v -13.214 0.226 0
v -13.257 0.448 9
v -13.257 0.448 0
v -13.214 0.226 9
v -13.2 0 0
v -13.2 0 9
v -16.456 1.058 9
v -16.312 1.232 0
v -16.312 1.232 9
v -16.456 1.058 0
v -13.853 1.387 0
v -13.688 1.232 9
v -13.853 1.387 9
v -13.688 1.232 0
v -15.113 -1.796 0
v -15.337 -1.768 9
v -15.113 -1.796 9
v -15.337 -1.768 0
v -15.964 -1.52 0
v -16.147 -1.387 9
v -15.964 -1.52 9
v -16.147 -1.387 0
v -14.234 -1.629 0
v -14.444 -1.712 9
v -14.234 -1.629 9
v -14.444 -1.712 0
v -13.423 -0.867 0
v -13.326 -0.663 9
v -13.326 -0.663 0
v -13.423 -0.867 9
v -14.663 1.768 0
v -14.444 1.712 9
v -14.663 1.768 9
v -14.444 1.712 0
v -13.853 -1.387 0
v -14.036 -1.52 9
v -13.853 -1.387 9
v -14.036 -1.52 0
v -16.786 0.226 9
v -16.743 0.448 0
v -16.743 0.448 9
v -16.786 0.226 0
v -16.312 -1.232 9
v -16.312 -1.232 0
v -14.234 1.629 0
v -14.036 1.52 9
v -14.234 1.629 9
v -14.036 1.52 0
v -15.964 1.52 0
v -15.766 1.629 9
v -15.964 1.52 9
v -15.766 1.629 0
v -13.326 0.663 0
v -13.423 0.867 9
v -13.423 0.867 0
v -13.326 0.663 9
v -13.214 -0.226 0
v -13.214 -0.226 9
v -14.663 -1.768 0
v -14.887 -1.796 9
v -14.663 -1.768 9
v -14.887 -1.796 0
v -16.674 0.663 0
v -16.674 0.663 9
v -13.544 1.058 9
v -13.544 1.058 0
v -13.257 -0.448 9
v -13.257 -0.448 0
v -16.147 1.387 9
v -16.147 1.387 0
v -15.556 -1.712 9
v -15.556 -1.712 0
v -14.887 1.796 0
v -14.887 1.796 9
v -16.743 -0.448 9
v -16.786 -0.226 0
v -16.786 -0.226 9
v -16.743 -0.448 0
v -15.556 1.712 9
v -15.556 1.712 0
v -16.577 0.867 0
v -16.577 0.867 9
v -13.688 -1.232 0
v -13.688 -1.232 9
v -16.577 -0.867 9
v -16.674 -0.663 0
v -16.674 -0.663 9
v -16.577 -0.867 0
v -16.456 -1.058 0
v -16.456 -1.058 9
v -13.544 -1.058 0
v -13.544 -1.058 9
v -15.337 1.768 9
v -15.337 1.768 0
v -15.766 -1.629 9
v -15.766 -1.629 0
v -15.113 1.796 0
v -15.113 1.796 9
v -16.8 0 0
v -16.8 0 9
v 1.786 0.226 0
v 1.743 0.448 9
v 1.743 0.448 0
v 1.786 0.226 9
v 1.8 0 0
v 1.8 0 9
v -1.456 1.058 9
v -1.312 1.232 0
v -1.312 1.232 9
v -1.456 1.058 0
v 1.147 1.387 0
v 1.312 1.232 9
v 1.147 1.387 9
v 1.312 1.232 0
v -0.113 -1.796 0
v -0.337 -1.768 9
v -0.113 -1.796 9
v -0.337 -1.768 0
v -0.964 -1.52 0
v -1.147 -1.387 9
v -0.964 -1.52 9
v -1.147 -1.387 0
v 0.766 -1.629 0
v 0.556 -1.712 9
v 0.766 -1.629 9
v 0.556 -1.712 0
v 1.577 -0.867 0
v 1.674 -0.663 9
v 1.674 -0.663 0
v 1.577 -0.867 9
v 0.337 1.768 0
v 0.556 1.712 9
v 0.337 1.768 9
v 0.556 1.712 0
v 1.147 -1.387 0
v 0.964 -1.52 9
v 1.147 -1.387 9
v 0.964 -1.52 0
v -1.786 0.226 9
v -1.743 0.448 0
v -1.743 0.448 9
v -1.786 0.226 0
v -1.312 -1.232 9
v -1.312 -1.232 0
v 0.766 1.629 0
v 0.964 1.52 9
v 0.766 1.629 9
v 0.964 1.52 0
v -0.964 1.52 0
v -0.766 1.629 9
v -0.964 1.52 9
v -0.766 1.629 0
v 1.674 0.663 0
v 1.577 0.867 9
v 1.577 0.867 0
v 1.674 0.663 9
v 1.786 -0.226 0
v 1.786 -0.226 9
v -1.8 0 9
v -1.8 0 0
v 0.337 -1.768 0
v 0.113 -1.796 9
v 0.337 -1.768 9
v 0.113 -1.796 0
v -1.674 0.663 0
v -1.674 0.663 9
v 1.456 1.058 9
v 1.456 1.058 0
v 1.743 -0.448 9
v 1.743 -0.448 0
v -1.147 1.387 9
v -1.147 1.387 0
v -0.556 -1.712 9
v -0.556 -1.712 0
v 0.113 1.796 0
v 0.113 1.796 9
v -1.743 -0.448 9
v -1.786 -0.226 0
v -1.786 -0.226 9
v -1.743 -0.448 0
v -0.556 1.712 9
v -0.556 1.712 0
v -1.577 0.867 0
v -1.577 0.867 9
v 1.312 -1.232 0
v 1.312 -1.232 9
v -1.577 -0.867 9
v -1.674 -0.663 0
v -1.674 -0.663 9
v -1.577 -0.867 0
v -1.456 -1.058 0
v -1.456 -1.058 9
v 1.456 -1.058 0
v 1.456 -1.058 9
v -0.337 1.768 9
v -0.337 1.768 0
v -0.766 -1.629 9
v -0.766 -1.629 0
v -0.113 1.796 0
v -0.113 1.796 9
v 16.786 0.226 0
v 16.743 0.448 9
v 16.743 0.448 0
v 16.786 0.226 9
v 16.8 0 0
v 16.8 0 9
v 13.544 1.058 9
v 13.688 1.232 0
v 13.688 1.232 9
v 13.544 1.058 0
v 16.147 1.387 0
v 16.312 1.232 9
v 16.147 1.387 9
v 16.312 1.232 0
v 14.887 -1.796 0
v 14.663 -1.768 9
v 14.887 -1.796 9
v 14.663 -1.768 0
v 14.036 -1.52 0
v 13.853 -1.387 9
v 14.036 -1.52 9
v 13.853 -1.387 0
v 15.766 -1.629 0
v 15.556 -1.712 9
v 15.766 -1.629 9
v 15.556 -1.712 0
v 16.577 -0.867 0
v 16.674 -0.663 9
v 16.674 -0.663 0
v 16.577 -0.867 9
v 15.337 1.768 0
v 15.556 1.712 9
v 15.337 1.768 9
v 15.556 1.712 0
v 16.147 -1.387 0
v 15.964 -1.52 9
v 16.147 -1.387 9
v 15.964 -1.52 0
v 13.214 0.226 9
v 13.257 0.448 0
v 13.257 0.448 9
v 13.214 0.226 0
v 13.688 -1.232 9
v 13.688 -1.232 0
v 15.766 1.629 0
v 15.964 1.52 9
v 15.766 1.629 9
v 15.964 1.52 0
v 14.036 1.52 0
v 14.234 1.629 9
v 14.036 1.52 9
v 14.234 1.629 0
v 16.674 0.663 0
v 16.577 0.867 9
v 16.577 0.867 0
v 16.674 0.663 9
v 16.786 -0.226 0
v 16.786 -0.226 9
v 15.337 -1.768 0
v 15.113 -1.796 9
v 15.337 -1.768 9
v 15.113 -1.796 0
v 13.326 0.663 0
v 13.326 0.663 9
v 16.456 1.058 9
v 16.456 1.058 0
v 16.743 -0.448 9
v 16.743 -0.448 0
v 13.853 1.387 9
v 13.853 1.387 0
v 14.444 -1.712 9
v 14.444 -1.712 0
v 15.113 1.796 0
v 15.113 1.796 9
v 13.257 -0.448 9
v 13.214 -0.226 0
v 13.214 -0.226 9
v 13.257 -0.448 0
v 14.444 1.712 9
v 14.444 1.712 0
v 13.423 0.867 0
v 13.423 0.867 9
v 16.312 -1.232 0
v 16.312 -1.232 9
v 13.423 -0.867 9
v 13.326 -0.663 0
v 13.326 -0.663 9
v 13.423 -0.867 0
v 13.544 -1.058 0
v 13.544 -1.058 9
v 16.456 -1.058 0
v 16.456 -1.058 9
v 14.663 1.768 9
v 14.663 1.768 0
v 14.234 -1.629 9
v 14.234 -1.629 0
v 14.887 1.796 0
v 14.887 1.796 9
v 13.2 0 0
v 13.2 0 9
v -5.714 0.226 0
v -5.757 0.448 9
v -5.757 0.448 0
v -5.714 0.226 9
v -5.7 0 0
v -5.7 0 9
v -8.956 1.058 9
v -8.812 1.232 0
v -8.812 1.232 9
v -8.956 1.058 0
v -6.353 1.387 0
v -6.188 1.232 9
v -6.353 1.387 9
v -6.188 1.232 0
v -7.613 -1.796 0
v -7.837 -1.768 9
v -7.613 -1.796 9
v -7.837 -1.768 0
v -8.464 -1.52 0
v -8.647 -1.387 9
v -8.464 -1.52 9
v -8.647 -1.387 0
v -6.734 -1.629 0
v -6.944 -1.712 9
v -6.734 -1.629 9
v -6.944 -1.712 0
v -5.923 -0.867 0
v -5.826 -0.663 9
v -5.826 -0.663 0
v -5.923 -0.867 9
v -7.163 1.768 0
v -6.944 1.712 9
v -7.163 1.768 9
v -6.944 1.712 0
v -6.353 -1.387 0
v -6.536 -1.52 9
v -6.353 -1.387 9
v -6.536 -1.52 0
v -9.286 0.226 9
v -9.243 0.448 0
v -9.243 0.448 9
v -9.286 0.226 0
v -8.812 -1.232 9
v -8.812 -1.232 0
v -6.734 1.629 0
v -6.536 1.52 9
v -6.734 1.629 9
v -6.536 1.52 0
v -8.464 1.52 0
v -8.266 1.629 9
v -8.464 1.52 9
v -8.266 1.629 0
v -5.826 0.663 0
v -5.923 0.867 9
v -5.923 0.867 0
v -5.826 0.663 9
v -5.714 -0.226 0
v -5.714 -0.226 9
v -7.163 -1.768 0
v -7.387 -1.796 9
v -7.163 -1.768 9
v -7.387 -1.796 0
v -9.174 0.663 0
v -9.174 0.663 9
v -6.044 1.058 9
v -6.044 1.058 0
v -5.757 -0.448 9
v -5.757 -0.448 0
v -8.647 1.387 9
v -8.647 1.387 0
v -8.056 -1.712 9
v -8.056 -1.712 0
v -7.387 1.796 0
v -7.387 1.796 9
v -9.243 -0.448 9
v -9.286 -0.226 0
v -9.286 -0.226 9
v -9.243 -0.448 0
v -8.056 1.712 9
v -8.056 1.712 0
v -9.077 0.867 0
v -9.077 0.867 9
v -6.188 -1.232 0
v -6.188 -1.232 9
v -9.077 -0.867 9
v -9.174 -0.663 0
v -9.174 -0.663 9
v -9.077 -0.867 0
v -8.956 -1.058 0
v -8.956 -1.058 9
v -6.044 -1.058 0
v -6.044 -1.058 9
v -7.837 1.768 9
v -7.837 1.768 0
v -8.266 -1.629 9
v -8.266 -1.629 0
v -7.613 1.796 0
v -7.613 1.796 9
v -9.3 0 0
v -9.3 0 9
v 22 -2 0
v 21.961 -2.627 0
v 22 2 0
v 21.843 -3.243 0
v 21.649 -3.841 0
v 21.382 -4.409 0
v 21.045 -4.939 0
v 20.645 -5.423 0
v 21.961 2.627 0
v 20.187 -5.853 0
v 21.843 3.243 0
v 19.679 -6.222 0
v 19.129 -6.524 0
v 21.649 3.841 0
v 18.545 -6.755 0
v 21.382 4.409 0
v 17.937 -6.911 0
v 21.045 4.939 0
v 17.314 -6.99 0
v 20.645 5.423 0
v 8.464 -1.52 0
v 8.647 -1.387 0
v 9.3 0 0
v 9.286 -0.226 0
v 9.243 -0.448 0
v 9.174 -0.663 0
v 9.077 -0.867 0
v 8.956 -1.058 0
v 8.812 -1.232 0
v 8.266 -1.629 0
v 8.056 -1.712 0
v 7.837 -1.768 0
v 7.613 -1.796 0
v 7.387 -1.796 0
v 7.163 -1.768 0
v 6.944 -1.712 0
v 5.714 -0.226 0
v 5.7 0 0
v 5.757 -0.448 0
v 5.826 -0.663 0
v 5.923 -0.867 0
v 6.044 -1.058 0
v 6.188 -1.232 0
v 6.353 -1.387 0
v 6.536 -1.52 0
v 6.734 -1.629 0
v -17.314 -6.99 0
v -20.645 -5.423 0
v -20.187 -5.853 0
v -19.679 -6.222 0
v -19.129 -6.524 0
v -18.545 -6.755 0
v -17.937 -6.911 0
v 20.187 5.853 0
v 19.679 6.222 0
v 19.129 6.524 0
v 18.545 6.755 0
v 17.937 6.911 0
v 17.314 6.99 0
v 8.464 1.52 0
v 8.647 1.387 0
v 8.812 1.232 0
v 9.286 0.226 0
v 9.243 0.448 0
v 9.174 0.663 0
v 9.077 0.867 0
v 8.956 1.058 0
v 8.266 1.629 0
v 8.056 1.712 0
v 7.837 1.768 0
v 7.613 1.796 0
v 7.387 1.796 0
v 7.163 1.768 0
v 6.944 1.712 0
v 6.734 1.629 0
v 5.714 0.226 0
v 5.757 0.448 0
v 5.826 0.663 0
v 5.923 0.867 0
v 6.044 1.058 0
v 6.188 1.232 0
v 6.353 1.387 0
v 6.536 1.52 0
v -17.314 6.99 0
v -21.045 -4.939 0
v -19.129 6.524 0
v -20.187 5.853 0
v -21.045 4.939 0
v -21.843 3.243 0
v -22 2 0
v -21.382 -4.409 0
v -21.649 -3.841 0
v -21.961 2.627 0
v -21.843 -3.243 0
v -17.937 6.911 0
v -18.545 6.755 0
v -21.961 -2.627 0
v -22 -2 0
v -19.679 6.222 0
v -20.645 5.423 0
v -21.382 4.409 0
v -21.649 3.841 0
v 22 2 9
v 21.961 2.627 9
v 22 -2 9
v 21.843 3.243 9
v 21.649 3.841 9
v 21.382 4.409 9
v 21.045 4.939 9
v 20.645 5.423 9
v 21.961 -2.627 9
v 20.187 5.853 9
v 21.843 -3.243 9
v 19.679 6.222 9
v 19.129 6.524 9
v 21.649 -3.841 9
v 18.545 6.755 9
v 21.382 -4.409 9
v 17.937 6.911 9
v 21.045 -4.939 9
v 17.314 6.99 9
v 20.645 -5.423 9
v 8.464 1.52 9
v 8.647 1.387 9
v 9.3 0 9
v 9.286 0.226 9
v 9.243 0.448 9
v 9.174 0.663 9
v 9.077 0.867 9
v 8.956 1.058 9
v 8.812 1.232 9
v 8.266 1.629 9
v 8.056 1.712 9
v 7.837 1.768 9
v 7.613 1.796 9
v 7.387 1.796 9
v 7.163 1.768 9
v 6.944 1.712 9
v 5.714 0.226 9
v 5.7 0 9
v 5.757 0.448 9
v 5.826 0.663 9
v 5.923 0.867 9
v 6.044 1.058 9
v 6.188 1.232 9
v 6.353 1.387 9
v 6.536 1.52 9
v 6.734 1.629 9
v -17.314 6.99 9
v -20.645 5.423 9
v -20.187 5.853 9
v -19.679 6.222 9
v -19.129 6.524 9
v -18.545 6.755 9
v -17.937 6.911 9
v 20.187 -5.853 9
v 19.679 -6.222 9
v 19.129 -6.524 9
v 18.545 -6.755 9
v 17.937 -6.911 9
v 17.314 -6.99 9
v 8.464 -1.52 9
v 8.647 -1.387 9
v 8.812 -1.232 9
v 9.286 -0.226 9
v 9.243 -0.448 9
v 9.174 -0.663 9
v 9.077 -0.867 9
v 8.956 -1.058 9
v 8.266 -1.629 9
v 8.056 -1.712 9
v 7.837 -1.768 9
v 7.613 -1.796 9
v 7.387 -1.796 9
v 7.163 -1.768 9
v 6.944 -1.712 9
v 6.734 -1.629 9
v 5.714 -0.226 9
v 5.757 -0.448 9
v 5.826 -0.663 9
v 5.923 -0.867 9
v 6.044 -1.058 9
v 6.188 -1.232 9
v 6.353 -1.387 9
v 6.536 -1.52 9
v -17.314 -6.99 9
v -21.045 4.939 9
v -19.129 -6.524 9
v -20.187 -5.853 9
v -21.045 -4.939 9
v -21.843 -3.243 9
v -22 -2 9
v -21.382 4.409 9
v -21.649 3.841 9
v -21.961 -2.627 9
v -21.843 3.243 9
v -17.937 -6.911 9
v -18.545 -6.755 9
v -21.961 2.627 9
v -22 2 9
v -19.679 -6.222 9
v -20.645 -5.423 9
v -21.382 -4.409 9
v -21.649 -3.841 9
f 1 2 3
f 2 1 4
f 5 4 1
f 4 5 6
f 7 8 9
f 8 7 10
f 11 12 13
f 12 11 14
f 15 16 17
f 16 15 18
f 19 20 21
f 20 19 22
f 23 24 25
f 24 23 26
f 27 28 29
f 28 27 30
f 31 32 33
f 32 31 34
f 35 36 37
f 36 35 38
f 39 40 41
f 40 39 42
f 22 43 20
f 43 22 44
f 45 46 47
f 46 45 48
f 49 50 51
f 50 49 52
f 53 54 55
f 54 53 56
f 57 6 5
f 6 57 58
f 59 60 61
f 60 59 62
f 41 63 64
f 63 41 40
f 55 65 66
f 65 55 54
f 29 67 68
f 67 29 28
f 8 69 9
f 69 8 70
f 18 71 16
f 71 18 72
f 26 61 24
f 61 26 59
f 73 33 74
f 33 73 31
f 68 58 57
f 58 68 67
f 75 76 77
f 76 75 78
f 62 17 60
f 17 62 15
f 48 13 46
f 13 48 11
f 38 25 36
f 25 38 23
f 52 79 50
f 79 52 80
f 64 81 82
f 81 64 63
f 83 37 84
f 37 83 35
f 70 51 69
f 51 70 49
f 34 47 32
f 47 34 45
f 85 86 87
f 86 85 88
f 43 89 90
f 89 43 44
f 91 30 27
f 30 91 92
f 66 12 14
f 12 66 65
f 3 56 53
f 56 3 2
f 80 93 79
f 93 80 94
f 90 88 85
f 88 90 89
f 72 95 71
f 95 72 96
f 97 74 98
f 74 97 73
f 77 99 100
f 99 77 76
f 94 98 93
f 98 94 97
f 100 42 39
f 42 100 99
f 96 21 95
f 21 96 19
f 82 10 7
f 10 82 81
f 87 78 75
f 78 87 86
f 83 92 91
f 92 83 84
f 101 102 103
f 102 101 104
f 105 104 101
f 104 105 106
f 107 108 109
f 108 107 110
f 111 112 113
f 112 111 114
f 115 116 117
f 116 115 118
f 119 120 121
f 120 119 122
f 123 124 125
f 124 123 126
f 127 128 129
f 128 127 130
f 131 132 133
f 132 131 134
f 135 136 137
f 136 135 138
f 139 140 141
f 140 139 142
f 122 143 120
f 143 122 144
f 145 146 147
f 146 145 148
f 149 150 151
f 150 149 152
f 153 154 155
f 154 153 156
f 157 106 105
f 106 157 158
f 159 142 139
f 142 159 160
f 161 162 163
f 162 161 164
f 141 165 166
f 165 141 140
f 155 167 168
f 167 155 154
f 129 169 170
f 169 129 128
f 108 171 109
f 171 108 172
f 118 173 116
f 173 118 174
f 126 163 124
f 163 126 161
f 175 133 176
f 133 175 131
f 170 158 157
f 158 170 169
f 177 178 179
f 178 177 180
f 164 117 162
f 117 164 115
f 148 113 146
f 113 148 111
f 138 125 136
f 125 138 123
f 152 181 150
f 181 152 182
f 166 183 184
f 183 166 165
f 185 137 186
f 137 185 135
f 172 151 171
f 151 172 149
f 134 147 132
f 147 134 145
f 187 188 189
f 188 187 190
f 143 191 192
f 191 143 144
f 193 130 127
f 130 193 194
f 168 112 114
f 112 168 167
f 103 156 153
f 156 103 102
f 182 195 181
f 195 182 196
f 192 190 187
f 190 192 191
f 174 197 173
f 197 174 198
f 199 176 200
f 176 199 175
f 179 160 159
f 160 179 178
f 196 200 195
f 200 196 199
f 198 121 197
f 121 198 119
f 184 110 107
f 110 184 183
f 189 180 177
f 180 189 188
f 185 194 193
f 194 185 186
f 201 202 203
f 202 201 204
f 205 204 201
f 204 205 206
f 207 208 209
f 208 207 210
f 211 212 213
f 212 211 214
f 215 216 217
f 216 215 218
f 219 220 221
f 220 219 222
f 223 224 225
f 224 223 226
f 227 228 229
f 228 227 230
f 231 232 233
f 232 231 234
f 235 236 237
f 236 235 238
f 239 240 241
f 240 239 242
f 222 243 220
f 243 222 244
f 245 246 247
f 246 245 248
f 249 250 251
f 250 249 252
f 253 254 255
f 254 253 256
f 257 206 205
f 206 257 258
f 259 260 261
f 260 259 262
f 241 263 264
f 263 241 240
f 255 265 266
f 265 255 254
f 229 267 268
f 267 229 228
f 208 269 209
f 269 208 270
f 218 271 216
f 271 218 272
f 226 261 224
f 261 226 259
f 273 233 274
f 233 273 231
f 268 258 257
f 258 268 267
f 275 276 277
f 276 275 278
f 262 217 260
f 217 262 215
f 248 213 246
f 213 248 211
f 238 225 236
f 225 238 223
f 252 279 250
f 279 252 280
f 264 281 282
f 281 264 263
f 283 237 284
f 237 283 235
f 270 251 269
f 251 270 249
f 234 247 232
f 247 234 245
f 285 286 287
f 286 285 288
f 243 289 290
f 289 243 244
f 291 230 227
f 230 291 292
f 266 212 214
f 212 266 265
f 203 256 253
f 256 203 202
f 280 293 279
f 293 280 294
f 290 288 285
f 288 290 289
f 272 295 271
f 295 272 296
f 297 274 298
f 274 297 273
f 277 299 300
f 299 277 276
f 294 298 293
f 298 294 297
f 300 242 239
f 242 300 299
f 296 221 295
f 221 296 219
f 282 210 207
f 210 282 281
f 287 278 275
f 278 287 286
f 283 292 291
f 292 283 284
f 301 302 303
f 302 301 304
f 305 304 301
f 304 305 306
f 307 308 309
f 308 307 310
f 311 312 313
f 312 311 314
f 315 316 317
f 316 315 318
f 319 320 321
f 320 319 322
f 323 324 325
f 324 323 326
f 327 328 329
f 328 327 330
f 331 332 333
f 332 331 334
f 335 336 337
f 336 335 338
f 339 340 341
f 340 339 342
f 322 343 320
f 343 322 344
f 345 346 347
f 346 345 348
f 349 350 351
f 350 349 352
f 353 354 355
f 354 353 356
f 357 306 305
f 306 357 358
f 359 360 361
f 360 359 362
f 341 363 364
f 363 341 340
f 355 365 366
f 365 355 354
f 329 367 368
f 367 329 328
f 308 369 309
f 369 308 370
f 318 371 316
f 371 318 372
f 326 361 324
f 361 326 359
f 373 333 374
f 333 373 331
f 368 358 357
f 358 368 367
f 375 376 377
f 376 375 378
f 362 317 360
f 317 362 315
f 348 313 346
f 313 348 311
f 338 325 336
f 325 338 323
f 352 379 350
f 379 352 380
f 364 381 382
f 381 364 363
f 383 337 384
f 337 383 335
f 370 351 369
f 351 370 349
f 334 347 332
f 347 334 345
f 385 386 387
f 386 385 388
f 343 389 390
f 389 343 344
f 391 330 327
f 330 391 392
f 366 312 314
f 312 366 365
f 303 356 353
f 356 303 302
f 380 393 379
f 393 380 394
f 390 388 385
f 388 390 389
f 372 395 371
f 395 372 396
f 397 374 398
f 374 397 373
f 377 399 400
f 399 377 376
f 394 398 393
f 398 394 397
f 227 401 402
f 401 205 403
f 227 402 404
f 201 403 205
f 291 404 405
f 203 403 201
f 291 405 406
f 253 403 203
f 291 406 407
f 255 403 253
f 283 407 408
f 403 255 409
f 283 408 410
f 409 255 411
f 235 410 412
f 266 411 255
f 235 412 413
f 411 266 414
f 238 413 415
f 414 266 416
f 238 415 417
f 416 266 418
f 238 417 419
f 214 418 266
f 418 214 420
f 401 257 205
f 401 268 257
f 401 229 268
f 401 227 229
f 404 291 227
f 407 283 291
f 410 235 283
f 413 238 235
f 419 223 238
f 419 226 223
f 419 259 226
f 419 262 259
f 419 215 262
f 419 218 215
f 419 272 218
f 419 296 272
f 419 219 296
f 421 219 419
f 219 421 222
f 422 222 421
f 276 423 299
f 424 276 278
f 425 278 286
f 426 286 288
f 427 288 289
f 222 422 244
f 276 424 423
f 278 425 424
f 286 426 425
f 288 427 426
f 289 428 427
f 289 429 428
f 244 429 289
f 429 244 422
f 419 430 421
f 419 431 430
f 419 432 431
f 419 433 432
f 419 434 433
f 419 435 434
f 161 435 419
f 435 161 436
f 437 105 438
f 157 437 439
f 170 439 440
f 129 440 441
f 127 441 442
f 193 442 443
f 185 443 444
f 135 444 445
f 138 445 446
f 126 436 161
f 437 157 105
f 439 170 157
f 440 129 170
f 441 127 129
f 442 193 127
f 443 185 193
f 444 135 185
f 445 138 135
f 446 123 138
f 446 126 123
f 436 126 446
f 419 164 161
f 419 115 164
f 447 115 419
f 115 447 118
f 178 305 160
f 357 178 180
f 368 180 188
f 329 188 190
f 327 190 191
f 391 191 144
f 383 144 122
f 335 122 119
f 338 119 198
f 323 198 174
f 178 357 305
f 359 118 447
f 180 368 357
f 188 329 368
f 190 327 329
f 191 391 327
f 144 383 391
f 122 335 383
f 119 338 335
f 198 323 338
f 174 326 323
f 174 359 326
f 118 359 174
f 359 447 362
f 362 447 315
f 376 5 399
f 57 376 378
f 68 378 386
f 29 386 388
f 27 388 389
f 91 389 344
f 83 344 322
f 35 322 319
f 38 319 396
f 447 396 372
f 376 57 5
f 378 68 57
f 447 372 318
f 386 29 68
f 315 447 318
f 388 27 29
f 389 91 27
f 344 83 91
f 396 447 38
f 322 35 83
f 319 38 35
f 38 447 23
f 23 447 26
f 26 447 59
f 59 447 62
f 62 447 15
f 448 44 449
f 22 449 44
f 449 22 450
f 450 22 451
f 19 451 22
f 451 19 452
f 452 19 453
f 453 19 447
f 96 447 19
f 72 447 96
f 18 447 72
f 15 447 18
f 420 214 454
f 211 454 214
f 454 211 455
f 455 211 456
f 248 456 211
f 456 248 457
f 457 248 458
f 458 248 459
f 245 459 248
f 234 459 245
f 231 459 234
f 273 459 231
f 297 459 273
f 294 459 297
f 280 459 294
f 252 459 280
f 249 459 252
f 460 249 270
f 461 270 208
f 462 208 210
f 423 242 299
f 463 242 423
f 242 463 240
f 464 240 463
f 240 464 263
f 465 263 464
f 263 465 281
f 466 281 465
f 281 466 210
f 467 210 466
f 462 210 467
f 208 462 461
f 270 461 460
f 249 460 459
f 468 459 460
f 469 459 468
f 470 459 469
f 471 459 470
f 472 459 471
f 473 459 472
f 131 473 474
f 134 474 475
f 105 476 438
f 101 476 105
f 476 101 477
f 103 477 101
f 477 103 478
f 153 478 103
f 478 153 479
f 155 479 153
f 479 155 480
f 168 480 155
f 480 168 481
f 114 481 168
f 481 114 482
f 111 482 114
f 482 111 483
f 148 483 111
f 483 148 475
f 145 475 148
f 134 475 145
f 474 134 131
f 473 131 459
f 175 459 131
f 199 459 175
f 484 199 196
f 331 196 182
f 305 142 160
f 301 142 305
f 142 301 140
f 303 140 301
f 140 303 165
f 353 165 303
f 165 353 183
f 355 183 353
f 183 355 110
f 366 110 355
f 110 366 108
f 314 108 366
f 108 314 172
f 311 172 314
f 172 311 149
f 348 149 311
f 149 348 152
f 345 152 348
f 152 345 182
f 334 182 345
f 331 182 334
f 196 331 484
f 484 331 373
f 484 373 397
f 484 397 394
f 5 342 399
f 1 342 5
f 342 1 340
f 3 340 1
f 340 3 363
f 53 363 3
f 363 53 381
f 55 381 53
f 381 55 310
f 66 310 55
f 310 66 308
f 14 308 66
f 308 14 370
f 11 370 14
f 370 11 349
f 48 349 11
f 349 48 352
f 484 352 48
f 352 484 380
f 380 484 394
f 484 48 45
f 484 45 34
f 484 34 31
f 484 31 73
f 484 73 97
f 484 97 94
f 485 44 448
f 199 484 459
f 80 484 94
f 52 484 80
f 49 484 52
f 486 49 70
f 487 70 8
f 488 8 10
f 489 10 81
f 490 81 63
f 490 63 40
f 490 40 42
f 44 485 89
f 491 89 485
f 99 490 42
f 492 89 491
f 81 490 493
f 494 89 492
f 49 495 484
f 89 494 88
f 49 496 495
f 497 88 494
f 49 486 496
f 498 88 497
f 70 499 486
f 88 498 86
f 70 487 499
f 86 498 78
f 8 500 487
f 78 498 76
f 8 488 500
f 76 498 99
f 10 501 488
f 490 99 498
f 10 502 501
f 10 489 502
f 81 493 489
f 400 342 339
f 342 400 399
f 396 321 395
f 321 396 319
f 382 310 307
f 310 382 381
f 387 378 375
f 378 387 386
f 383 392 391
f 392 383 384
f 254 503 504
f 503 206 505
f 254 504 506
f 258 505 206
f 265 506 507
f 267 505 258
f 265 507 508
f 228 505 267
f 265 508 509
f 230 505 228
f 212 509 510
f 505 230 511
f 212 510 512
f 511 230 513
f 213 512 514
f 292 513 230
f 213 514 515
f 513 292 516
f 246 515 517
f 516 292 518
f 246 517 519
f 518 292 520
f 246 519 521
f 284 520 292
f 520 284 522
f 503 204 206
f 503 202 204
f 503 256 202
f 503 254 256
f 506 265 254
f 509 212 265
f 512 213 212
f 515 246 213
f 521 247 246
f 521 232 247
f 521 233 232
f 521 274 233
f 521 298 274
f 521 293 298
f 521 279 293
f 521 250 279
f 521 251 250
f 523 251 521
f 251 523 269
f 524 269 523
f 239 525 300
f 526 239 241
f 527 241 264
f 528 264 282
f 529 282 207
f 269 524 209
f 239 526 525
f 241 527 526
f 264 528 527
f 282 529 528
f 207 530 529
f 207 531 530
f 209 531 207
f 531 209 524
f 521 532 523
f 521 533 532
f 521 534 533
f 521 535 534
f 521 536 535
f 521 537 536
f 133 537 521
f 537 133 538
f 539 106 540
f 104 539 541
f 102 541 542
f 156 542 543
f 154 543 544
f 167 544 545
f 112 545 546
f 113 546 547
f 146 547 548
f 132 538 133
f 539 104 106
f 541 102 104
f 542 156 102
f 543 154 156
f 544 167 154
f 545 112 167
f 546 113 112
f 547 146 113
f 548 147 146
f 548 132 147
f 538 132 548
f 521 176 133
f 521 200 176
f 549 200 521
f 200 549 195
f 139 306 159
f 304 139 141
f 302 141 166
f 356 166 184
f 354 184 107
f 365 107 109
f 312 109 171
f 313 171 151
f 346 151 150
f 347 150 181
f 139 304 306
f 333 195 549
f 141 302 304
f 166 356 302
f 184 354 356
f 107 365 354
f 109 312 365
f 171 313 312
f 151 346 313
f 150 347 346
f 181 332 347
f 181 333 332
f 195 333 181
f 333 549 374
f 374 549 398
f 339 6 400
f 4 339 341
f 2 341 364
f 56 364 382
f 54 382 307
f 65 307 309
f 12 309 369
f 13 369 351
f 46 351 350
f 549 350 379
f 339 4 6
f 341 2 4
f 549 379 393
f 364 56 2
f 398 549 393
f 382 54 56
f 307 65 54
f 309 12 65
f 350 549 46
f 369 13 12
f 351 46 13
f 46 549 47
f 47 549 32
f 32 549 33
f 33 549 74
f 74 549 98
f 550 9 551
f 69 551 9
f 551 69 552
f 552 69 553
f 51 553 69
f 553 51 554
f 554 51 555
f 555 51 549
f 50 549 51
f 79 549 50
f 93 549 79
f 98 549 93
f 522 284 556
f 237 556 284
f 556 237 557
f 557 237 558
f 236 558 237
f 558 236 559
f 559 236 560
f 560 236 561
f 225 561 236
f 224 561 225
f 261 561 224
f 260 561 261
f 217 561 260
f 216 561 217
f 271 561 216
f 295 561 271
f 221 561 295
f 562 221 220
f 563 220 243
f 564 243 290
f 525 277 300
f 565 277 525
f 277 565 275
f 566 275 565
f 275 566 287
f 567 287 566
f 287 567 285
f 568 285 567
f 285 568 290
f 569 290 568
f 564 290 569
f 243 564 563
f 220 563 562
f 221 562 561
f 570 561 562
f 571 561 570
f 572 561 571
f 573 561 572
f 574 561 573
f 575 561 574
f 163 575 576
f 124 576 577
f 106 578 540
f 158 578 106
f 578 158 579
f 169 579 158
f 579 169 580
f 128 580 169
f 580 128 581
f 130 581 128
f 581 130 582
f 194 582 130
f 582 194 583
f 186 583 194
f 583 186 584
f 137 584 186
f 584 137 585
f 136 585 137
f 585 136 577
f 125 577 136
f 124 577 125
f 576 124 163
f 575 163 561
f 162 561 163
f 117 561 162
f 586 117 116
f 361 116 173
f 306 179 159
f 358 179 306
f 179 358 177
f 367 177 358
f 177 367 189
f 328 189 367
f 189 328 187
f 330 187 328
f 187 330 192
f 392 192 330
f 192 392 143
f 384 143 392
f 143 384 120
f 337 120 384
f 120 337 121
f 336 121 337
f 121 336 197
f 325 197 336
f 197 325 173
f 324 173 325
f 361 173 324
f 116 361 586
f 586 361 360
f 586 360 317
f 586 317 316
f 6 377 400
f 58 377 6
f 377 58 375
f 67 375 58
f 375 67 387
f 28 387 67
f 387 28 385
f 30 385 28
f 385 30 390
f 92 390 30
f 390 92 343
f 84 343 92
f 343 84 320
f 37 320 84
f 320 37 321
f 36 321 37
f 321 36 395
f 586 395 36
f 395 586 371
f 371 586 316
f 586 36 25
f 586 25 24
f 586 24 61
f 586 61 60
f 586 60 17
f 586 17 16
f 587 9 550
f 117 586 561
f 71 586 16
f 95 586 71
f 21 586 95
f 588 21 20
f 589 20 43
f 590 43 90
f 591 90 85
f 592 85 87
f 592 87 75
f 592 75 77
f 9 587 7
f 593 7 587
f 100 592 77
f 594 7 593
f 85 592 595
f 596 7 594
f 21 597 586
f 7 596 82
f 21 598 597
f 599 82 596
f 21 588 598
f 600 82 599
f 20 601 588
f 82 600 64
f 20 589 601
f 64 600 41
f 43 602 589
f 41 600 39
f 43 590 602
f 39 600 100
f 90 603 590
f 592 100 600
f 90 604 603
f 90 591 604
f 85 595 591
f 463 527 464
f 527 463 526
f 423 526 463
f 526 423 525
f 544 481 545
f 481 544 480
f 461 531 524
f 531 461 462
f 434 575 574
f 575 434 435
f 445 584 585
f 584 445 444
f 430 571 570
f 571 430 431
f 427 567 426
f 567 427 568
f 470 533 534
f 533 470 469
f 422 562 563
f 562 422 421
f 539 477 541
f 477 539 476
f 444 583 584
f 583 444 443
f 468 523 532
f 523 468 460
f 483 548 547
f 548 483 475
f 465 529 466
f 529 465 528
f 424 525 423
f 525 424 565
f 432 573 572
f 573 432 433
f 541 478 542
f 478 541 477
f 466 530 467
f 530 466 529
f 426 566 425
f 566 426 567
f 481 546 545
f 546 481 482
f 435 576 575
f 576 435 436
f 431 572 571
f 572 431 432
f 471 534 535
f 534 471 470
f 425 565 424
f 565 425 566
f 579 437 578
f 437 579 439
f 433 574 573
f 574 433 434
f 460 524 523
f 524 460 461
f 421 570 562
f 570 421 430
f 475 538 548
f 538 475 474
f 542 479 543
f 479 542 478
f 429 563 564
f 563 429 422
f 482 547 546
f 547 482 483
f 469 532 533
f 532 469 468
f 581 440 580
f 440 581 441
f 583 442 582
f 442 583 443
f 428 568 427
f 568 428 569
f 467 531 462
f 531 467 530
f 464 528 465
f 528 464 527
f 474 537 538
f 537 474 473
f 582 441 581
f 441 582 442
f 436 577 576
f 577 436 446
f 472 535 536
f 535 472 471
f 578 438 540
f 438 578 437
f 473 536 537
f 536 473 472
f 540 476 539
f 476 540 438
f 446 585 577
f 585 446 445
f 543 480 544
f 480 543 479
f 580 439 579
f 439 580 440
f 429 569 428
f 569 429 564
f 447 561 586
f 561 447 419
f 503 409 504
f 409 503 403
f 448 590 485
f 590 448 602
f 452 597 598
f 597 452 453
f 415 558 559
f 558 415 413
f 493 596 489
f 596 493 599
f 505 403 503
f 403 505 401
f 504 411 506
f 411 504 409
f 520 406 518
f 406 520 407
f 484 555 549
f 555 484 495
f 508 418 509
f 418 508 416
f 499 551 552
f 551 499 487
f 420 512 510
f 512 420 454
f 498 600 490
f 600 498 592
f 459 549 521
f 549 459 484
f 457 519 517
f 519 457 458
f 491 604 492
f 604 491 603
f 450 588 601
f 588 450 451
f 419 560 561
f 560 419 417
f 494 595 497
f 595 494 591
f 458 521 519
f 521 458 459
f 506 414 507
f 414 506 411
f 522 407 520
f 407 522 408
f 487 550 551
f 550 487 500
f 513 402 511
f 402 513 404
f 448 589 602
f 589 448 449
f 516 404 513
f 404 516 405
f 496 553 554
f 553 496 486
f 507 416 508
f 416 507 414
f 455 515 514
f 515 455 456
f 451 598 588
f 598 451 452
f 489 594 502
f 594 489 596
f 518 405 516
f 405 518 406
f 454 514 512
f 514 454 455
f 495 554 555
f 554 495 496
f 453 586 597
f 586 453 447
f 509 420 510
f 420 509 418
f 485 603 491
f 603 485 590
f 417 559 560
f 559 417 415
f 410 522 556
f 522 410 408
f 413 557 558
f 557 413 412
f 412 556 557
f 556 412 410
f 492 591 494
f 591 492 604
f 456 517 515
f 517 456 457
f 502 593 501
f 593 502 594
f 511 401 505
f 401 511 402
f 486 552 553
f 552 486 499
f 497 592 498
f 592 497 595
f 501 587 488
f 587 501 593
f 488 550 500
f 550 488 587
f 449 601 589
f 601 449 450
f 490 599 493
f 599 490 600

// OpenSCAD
$fn = 50;


difference() {
	union() {
		hull() {
			translate(v = [-17.0000000000, 2.0000000000, 0]) {
				cylinder(h = 9, r = 5);
			}
			translate(v = [17.0000000000, 2.0000000000, 0]) {
				cylinder(h = 9, r = 5);
			}
			translate(v = [-17.0000000000, -2.0000000000, 0]) {
				cylinder(h = 9, r = 5);
			}
			translate(v = [17.0000000000, -2.0000000000, 0]) {
				cylinder(h = 9, r = 5);
			}
		}
	}
	union() {
		translate(v = [-15.0000000000, 0.0000000000, -100.0000000000]) {
			cylinder(h = 200, r = 1.8000000000);
		}
		translate(v = [0.0000000000, 0.0000000000, -100.0000000000]) {
			cylinder(h = 200, r = 1.8000000000);
		}
		translate(v = [15.0000000000, 0.0000000000, -100.0000000000]) {
			cylinder(h = 200, r = 1.8000000000);
		}
		translate(v = [-15.0000000000, 0.0000000000, 0]) {
			cylinder(h = 9, r = 1.8000000000);
		}
		translate(v = [-7.5000000000, 0.0000000000, 0]) {
			cylinder(h = 9, r = 1.8000000000);
		}
		cylinder(h = 9, r = 1.8000000000);
		translate(v = [7.5000000000, 0.0000000000, 0]) {
			cylinder(h = 9, r = 1.8000000000);
		}
		translate(v = [15.0000000000, 0.0000000000, 0]) {
			cylinder(h = 9, r = 1.8000000000);
		}
		translate(v = [-15.0000000000, 0.0000000000, 0]) {
			cylinder(h = 9, r = 1.8000000000);
		}
		translate(v = [-7.5000000000, 0.0000000000, 0]) {
			cylinder(h = 9, r = 1.8000000000);
		}
		cylinder(h = 9, r = 1.8000000000);
		translate(v = [7.5000000000, 0.0000000000, 0]) {
			cylinder(h = 9, r = 1.8000000000);
		}
		translate(v = [15.0000000000, 0.0000000000, 0]) {
			cylinder(h = 9, r = 1.8000000000);
		}
		translate(v = [-15.0000000000, 0.0000000000, 0]) {
			cylinder(h = 9, r = 1.8000000000);
		}
		translate(v = [-7.5000000000, 0.0000000000, 0]) {
			cylinder(h = 9, r = 1.8000000000);
		}
		cylinder(h = 9, r = 1.8000000000);
		translate(v = [7.5000000000, 0.0000000000, 0]) {
			cylinder(h = 9, r = 1.8000000000);
		}
		translate(v = [15.0000000000, 0.0000000000, 0]) {
			cylinder(h = 9, r = 1.8000000000);
		}
	}
}
